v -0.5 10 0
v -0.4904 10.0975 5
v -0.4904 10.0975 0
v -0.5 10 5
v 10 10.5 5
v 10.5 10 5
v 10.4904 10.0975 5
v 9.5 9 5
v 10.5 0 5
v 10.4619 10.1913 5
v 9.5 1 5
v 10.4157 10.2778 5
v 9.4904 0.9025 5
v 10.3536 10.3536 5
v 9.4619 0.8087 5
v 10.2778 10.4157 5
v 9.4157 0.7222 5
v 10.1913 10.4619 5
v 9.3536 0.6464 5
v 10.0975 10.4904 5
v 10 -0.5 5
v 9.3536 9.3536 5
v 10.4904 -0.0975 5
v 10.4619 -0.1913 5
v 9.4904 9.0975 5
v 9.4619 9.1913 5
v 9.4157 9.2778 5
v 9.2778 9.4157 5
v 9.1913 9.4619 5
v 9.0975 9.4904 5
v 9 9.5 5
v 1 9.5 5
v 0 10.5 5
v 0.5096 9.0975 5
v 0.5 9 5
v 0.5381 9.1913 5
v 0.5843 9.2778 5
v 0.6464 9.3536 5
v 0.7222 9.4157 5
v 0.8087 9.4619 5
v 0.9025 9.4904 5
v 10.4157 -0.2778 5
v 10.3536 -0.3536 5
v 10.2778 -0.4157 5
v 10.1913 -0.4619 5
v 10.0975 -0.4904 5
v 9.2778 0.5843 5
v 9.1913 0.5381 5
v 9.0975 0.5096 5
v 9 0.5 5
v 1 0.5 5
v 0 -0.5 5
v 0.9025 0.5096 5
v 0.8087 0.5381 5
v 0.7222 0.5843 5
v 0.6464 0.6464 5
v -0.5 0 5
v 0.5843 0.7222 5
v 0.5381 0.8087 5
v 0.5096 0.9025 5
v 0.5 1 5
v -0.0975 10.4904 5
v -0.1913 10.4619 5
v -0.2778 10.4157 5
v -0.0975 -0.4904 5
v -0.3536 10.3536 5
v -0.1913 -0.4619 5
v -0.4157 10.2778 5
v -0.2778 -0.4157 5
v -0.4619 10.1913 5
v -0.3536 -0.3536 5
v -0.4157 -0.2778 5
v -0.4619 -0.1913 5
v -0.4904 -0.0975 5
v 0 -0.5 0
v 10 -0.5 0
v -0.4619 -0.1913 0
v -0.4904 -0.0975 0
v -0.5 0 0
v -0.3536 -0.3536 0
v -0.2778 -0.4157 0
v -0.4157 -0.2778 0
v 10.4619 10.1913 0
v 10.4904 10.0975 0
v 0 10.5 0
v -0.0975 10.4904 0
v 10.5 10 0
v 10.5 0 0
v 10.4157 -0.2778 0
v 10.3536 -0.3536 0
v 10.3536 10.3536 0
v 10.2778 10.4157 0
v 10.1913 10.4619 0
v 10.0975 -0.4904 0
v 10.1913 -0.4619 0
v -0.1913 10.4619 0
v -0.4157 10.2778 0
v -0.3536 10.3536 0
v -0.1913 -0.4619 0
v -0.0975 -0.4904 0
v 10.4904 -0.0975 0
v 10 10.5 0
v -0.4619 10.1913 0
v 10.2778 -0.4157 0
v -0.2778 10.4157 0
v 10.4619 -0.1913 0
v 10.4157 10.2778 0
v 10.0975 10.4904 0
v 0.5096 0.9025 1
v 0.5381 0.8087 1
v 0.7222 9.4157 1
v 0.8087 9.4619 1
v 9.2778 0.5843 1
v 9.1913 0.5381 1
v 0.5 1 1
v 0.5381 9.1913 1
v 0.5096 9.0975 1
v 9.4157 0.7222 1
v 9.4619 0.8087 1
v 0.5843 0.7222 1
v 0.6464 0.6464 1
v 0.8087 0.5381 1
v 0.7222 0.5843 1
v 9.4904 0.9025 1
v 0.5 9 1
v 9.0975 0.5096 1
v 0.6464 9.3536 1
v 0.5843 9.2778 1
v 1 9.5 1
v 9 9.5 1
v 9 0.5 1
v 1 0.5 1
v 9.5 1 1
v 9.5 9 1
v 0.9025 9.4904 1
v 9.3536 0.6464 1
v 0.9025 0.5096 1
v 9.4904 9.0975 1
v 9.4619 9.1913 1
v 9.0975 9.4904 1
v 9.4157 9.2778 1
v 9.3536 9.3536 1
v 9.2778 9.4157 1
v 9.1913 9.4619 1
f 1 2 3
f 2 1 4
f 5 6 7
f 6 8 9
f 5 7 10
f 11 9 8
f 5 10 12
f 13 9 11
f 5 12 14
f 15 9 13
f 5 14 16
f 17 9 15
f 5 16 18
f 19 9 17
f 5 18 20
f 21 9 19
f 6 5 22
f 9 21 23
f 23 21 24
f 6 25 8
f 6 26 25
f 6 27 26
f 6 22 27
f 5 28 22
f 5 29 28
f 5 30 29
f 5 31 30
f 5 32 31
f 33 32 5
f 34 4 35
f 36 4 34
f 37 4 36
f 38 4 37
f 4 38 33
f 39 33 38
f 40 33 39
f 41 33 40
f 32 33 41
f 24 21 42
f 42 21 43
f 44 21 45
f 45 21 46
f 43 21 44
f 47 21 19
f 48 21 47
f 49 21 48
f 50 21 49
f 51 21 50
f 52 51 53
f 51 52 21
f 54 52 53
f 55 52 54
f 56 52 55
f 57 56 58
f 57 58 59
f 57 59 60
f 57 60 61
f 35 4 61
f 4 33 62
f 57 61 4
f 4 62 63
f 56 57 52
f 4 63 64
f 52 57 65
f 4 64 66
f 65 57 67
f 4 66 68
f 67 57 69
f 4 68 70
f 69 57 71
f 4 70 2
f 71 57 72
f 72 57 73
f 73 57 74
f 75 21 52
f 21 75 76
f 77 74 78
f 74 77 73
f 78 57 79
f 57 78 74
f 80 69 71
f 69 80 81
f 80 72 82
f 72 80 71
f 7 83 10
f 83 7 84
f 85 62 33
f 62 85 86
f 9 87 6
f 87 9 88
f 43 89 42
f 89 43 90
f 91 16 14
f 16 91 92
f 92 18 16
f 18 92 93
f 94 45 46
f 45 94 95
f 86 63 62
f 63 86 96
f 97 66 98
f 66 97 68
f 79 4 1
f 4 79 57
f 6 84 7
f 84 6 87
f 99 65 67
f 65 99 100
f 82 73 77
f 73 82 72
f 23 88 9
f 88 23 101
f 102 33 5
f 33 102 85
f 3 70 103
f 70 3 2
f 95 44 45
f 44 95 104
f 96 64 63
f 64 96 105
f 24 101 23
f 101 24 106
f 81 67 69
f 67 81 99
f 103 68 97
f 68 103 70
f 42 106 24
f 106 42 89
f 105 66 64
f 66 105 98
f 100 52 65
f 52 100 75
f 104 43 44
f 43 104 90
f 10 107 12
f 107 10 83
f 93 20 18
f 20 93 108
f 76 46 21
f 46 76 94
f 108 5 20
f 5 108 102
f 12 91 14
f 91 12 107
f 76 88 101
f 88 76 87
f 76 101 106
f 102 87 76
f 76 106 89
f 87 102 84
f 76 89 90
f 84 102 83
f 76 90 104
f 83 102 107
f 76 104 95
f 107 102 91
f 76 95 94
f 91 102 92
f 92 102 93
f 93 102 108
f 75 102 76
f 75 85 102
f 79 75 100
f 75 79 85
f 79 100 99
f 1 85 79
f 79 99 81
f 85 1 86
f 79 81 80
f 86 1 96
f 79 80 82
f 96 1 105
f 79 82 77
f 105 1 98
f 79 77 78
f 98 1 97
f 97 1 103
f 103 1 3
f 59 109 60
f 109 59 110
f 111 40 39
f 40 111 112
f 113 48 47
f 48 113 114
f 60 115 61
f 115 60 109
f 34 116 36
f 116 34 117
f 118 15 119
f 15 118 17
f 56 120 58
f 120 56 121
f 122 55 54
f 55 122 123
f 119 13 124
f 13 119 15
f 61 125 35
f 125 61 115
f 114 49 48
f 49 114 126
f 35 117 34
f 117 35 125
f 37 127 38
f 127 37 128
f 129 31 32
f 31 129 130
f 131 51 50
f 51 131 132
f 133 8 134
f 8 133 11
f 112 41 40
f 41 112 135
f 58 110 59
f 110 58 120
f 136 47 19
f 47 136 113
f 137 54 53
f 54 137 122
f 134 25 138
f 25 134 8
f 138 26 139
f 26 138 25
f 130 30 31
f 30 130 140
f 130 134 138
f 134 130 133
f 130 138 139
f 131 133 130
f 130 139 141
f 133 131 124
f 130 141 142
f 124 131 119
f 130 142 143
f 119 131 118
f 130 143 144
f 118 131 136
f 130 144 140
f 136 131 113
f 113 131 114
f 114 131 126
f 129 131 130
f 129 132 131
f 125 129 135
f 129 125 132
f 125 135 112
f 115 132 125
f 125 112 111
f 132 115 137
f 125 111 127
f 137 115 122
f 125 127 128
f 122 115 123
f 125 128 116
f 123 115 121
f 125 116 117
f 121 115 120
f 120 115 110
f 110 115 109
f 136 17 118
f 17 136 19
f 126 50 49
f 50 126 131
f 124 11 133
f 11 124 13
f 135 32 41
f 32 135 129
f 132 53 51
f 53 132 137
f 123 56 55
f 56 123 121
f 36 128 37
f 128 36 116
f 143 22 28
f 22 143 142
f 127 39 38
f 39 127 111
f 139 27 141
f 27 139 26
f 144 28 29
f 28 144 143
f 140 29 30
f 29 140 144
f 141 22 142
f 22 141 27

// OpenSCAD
$fn=32;

difference() {
    linear_extrude(5) {
        hull() {
            translate([0,0]) circle(d=1);
            translate([10,0]) circle(d=1);
            translate([0,10]) circle(d=1);
            translate([10,10]) circle(d=1);
        }
    }

    translate([1,1,1]) {
        linear_extrude(4) {
            hull() {
                translate([0,0]) circle(d=1);
                translate([8,0]) circle(d=1);
                translate([0,8]) circle(d=1);
                translate([8,8]) circle(d=1);
            }
        }
    }
}
